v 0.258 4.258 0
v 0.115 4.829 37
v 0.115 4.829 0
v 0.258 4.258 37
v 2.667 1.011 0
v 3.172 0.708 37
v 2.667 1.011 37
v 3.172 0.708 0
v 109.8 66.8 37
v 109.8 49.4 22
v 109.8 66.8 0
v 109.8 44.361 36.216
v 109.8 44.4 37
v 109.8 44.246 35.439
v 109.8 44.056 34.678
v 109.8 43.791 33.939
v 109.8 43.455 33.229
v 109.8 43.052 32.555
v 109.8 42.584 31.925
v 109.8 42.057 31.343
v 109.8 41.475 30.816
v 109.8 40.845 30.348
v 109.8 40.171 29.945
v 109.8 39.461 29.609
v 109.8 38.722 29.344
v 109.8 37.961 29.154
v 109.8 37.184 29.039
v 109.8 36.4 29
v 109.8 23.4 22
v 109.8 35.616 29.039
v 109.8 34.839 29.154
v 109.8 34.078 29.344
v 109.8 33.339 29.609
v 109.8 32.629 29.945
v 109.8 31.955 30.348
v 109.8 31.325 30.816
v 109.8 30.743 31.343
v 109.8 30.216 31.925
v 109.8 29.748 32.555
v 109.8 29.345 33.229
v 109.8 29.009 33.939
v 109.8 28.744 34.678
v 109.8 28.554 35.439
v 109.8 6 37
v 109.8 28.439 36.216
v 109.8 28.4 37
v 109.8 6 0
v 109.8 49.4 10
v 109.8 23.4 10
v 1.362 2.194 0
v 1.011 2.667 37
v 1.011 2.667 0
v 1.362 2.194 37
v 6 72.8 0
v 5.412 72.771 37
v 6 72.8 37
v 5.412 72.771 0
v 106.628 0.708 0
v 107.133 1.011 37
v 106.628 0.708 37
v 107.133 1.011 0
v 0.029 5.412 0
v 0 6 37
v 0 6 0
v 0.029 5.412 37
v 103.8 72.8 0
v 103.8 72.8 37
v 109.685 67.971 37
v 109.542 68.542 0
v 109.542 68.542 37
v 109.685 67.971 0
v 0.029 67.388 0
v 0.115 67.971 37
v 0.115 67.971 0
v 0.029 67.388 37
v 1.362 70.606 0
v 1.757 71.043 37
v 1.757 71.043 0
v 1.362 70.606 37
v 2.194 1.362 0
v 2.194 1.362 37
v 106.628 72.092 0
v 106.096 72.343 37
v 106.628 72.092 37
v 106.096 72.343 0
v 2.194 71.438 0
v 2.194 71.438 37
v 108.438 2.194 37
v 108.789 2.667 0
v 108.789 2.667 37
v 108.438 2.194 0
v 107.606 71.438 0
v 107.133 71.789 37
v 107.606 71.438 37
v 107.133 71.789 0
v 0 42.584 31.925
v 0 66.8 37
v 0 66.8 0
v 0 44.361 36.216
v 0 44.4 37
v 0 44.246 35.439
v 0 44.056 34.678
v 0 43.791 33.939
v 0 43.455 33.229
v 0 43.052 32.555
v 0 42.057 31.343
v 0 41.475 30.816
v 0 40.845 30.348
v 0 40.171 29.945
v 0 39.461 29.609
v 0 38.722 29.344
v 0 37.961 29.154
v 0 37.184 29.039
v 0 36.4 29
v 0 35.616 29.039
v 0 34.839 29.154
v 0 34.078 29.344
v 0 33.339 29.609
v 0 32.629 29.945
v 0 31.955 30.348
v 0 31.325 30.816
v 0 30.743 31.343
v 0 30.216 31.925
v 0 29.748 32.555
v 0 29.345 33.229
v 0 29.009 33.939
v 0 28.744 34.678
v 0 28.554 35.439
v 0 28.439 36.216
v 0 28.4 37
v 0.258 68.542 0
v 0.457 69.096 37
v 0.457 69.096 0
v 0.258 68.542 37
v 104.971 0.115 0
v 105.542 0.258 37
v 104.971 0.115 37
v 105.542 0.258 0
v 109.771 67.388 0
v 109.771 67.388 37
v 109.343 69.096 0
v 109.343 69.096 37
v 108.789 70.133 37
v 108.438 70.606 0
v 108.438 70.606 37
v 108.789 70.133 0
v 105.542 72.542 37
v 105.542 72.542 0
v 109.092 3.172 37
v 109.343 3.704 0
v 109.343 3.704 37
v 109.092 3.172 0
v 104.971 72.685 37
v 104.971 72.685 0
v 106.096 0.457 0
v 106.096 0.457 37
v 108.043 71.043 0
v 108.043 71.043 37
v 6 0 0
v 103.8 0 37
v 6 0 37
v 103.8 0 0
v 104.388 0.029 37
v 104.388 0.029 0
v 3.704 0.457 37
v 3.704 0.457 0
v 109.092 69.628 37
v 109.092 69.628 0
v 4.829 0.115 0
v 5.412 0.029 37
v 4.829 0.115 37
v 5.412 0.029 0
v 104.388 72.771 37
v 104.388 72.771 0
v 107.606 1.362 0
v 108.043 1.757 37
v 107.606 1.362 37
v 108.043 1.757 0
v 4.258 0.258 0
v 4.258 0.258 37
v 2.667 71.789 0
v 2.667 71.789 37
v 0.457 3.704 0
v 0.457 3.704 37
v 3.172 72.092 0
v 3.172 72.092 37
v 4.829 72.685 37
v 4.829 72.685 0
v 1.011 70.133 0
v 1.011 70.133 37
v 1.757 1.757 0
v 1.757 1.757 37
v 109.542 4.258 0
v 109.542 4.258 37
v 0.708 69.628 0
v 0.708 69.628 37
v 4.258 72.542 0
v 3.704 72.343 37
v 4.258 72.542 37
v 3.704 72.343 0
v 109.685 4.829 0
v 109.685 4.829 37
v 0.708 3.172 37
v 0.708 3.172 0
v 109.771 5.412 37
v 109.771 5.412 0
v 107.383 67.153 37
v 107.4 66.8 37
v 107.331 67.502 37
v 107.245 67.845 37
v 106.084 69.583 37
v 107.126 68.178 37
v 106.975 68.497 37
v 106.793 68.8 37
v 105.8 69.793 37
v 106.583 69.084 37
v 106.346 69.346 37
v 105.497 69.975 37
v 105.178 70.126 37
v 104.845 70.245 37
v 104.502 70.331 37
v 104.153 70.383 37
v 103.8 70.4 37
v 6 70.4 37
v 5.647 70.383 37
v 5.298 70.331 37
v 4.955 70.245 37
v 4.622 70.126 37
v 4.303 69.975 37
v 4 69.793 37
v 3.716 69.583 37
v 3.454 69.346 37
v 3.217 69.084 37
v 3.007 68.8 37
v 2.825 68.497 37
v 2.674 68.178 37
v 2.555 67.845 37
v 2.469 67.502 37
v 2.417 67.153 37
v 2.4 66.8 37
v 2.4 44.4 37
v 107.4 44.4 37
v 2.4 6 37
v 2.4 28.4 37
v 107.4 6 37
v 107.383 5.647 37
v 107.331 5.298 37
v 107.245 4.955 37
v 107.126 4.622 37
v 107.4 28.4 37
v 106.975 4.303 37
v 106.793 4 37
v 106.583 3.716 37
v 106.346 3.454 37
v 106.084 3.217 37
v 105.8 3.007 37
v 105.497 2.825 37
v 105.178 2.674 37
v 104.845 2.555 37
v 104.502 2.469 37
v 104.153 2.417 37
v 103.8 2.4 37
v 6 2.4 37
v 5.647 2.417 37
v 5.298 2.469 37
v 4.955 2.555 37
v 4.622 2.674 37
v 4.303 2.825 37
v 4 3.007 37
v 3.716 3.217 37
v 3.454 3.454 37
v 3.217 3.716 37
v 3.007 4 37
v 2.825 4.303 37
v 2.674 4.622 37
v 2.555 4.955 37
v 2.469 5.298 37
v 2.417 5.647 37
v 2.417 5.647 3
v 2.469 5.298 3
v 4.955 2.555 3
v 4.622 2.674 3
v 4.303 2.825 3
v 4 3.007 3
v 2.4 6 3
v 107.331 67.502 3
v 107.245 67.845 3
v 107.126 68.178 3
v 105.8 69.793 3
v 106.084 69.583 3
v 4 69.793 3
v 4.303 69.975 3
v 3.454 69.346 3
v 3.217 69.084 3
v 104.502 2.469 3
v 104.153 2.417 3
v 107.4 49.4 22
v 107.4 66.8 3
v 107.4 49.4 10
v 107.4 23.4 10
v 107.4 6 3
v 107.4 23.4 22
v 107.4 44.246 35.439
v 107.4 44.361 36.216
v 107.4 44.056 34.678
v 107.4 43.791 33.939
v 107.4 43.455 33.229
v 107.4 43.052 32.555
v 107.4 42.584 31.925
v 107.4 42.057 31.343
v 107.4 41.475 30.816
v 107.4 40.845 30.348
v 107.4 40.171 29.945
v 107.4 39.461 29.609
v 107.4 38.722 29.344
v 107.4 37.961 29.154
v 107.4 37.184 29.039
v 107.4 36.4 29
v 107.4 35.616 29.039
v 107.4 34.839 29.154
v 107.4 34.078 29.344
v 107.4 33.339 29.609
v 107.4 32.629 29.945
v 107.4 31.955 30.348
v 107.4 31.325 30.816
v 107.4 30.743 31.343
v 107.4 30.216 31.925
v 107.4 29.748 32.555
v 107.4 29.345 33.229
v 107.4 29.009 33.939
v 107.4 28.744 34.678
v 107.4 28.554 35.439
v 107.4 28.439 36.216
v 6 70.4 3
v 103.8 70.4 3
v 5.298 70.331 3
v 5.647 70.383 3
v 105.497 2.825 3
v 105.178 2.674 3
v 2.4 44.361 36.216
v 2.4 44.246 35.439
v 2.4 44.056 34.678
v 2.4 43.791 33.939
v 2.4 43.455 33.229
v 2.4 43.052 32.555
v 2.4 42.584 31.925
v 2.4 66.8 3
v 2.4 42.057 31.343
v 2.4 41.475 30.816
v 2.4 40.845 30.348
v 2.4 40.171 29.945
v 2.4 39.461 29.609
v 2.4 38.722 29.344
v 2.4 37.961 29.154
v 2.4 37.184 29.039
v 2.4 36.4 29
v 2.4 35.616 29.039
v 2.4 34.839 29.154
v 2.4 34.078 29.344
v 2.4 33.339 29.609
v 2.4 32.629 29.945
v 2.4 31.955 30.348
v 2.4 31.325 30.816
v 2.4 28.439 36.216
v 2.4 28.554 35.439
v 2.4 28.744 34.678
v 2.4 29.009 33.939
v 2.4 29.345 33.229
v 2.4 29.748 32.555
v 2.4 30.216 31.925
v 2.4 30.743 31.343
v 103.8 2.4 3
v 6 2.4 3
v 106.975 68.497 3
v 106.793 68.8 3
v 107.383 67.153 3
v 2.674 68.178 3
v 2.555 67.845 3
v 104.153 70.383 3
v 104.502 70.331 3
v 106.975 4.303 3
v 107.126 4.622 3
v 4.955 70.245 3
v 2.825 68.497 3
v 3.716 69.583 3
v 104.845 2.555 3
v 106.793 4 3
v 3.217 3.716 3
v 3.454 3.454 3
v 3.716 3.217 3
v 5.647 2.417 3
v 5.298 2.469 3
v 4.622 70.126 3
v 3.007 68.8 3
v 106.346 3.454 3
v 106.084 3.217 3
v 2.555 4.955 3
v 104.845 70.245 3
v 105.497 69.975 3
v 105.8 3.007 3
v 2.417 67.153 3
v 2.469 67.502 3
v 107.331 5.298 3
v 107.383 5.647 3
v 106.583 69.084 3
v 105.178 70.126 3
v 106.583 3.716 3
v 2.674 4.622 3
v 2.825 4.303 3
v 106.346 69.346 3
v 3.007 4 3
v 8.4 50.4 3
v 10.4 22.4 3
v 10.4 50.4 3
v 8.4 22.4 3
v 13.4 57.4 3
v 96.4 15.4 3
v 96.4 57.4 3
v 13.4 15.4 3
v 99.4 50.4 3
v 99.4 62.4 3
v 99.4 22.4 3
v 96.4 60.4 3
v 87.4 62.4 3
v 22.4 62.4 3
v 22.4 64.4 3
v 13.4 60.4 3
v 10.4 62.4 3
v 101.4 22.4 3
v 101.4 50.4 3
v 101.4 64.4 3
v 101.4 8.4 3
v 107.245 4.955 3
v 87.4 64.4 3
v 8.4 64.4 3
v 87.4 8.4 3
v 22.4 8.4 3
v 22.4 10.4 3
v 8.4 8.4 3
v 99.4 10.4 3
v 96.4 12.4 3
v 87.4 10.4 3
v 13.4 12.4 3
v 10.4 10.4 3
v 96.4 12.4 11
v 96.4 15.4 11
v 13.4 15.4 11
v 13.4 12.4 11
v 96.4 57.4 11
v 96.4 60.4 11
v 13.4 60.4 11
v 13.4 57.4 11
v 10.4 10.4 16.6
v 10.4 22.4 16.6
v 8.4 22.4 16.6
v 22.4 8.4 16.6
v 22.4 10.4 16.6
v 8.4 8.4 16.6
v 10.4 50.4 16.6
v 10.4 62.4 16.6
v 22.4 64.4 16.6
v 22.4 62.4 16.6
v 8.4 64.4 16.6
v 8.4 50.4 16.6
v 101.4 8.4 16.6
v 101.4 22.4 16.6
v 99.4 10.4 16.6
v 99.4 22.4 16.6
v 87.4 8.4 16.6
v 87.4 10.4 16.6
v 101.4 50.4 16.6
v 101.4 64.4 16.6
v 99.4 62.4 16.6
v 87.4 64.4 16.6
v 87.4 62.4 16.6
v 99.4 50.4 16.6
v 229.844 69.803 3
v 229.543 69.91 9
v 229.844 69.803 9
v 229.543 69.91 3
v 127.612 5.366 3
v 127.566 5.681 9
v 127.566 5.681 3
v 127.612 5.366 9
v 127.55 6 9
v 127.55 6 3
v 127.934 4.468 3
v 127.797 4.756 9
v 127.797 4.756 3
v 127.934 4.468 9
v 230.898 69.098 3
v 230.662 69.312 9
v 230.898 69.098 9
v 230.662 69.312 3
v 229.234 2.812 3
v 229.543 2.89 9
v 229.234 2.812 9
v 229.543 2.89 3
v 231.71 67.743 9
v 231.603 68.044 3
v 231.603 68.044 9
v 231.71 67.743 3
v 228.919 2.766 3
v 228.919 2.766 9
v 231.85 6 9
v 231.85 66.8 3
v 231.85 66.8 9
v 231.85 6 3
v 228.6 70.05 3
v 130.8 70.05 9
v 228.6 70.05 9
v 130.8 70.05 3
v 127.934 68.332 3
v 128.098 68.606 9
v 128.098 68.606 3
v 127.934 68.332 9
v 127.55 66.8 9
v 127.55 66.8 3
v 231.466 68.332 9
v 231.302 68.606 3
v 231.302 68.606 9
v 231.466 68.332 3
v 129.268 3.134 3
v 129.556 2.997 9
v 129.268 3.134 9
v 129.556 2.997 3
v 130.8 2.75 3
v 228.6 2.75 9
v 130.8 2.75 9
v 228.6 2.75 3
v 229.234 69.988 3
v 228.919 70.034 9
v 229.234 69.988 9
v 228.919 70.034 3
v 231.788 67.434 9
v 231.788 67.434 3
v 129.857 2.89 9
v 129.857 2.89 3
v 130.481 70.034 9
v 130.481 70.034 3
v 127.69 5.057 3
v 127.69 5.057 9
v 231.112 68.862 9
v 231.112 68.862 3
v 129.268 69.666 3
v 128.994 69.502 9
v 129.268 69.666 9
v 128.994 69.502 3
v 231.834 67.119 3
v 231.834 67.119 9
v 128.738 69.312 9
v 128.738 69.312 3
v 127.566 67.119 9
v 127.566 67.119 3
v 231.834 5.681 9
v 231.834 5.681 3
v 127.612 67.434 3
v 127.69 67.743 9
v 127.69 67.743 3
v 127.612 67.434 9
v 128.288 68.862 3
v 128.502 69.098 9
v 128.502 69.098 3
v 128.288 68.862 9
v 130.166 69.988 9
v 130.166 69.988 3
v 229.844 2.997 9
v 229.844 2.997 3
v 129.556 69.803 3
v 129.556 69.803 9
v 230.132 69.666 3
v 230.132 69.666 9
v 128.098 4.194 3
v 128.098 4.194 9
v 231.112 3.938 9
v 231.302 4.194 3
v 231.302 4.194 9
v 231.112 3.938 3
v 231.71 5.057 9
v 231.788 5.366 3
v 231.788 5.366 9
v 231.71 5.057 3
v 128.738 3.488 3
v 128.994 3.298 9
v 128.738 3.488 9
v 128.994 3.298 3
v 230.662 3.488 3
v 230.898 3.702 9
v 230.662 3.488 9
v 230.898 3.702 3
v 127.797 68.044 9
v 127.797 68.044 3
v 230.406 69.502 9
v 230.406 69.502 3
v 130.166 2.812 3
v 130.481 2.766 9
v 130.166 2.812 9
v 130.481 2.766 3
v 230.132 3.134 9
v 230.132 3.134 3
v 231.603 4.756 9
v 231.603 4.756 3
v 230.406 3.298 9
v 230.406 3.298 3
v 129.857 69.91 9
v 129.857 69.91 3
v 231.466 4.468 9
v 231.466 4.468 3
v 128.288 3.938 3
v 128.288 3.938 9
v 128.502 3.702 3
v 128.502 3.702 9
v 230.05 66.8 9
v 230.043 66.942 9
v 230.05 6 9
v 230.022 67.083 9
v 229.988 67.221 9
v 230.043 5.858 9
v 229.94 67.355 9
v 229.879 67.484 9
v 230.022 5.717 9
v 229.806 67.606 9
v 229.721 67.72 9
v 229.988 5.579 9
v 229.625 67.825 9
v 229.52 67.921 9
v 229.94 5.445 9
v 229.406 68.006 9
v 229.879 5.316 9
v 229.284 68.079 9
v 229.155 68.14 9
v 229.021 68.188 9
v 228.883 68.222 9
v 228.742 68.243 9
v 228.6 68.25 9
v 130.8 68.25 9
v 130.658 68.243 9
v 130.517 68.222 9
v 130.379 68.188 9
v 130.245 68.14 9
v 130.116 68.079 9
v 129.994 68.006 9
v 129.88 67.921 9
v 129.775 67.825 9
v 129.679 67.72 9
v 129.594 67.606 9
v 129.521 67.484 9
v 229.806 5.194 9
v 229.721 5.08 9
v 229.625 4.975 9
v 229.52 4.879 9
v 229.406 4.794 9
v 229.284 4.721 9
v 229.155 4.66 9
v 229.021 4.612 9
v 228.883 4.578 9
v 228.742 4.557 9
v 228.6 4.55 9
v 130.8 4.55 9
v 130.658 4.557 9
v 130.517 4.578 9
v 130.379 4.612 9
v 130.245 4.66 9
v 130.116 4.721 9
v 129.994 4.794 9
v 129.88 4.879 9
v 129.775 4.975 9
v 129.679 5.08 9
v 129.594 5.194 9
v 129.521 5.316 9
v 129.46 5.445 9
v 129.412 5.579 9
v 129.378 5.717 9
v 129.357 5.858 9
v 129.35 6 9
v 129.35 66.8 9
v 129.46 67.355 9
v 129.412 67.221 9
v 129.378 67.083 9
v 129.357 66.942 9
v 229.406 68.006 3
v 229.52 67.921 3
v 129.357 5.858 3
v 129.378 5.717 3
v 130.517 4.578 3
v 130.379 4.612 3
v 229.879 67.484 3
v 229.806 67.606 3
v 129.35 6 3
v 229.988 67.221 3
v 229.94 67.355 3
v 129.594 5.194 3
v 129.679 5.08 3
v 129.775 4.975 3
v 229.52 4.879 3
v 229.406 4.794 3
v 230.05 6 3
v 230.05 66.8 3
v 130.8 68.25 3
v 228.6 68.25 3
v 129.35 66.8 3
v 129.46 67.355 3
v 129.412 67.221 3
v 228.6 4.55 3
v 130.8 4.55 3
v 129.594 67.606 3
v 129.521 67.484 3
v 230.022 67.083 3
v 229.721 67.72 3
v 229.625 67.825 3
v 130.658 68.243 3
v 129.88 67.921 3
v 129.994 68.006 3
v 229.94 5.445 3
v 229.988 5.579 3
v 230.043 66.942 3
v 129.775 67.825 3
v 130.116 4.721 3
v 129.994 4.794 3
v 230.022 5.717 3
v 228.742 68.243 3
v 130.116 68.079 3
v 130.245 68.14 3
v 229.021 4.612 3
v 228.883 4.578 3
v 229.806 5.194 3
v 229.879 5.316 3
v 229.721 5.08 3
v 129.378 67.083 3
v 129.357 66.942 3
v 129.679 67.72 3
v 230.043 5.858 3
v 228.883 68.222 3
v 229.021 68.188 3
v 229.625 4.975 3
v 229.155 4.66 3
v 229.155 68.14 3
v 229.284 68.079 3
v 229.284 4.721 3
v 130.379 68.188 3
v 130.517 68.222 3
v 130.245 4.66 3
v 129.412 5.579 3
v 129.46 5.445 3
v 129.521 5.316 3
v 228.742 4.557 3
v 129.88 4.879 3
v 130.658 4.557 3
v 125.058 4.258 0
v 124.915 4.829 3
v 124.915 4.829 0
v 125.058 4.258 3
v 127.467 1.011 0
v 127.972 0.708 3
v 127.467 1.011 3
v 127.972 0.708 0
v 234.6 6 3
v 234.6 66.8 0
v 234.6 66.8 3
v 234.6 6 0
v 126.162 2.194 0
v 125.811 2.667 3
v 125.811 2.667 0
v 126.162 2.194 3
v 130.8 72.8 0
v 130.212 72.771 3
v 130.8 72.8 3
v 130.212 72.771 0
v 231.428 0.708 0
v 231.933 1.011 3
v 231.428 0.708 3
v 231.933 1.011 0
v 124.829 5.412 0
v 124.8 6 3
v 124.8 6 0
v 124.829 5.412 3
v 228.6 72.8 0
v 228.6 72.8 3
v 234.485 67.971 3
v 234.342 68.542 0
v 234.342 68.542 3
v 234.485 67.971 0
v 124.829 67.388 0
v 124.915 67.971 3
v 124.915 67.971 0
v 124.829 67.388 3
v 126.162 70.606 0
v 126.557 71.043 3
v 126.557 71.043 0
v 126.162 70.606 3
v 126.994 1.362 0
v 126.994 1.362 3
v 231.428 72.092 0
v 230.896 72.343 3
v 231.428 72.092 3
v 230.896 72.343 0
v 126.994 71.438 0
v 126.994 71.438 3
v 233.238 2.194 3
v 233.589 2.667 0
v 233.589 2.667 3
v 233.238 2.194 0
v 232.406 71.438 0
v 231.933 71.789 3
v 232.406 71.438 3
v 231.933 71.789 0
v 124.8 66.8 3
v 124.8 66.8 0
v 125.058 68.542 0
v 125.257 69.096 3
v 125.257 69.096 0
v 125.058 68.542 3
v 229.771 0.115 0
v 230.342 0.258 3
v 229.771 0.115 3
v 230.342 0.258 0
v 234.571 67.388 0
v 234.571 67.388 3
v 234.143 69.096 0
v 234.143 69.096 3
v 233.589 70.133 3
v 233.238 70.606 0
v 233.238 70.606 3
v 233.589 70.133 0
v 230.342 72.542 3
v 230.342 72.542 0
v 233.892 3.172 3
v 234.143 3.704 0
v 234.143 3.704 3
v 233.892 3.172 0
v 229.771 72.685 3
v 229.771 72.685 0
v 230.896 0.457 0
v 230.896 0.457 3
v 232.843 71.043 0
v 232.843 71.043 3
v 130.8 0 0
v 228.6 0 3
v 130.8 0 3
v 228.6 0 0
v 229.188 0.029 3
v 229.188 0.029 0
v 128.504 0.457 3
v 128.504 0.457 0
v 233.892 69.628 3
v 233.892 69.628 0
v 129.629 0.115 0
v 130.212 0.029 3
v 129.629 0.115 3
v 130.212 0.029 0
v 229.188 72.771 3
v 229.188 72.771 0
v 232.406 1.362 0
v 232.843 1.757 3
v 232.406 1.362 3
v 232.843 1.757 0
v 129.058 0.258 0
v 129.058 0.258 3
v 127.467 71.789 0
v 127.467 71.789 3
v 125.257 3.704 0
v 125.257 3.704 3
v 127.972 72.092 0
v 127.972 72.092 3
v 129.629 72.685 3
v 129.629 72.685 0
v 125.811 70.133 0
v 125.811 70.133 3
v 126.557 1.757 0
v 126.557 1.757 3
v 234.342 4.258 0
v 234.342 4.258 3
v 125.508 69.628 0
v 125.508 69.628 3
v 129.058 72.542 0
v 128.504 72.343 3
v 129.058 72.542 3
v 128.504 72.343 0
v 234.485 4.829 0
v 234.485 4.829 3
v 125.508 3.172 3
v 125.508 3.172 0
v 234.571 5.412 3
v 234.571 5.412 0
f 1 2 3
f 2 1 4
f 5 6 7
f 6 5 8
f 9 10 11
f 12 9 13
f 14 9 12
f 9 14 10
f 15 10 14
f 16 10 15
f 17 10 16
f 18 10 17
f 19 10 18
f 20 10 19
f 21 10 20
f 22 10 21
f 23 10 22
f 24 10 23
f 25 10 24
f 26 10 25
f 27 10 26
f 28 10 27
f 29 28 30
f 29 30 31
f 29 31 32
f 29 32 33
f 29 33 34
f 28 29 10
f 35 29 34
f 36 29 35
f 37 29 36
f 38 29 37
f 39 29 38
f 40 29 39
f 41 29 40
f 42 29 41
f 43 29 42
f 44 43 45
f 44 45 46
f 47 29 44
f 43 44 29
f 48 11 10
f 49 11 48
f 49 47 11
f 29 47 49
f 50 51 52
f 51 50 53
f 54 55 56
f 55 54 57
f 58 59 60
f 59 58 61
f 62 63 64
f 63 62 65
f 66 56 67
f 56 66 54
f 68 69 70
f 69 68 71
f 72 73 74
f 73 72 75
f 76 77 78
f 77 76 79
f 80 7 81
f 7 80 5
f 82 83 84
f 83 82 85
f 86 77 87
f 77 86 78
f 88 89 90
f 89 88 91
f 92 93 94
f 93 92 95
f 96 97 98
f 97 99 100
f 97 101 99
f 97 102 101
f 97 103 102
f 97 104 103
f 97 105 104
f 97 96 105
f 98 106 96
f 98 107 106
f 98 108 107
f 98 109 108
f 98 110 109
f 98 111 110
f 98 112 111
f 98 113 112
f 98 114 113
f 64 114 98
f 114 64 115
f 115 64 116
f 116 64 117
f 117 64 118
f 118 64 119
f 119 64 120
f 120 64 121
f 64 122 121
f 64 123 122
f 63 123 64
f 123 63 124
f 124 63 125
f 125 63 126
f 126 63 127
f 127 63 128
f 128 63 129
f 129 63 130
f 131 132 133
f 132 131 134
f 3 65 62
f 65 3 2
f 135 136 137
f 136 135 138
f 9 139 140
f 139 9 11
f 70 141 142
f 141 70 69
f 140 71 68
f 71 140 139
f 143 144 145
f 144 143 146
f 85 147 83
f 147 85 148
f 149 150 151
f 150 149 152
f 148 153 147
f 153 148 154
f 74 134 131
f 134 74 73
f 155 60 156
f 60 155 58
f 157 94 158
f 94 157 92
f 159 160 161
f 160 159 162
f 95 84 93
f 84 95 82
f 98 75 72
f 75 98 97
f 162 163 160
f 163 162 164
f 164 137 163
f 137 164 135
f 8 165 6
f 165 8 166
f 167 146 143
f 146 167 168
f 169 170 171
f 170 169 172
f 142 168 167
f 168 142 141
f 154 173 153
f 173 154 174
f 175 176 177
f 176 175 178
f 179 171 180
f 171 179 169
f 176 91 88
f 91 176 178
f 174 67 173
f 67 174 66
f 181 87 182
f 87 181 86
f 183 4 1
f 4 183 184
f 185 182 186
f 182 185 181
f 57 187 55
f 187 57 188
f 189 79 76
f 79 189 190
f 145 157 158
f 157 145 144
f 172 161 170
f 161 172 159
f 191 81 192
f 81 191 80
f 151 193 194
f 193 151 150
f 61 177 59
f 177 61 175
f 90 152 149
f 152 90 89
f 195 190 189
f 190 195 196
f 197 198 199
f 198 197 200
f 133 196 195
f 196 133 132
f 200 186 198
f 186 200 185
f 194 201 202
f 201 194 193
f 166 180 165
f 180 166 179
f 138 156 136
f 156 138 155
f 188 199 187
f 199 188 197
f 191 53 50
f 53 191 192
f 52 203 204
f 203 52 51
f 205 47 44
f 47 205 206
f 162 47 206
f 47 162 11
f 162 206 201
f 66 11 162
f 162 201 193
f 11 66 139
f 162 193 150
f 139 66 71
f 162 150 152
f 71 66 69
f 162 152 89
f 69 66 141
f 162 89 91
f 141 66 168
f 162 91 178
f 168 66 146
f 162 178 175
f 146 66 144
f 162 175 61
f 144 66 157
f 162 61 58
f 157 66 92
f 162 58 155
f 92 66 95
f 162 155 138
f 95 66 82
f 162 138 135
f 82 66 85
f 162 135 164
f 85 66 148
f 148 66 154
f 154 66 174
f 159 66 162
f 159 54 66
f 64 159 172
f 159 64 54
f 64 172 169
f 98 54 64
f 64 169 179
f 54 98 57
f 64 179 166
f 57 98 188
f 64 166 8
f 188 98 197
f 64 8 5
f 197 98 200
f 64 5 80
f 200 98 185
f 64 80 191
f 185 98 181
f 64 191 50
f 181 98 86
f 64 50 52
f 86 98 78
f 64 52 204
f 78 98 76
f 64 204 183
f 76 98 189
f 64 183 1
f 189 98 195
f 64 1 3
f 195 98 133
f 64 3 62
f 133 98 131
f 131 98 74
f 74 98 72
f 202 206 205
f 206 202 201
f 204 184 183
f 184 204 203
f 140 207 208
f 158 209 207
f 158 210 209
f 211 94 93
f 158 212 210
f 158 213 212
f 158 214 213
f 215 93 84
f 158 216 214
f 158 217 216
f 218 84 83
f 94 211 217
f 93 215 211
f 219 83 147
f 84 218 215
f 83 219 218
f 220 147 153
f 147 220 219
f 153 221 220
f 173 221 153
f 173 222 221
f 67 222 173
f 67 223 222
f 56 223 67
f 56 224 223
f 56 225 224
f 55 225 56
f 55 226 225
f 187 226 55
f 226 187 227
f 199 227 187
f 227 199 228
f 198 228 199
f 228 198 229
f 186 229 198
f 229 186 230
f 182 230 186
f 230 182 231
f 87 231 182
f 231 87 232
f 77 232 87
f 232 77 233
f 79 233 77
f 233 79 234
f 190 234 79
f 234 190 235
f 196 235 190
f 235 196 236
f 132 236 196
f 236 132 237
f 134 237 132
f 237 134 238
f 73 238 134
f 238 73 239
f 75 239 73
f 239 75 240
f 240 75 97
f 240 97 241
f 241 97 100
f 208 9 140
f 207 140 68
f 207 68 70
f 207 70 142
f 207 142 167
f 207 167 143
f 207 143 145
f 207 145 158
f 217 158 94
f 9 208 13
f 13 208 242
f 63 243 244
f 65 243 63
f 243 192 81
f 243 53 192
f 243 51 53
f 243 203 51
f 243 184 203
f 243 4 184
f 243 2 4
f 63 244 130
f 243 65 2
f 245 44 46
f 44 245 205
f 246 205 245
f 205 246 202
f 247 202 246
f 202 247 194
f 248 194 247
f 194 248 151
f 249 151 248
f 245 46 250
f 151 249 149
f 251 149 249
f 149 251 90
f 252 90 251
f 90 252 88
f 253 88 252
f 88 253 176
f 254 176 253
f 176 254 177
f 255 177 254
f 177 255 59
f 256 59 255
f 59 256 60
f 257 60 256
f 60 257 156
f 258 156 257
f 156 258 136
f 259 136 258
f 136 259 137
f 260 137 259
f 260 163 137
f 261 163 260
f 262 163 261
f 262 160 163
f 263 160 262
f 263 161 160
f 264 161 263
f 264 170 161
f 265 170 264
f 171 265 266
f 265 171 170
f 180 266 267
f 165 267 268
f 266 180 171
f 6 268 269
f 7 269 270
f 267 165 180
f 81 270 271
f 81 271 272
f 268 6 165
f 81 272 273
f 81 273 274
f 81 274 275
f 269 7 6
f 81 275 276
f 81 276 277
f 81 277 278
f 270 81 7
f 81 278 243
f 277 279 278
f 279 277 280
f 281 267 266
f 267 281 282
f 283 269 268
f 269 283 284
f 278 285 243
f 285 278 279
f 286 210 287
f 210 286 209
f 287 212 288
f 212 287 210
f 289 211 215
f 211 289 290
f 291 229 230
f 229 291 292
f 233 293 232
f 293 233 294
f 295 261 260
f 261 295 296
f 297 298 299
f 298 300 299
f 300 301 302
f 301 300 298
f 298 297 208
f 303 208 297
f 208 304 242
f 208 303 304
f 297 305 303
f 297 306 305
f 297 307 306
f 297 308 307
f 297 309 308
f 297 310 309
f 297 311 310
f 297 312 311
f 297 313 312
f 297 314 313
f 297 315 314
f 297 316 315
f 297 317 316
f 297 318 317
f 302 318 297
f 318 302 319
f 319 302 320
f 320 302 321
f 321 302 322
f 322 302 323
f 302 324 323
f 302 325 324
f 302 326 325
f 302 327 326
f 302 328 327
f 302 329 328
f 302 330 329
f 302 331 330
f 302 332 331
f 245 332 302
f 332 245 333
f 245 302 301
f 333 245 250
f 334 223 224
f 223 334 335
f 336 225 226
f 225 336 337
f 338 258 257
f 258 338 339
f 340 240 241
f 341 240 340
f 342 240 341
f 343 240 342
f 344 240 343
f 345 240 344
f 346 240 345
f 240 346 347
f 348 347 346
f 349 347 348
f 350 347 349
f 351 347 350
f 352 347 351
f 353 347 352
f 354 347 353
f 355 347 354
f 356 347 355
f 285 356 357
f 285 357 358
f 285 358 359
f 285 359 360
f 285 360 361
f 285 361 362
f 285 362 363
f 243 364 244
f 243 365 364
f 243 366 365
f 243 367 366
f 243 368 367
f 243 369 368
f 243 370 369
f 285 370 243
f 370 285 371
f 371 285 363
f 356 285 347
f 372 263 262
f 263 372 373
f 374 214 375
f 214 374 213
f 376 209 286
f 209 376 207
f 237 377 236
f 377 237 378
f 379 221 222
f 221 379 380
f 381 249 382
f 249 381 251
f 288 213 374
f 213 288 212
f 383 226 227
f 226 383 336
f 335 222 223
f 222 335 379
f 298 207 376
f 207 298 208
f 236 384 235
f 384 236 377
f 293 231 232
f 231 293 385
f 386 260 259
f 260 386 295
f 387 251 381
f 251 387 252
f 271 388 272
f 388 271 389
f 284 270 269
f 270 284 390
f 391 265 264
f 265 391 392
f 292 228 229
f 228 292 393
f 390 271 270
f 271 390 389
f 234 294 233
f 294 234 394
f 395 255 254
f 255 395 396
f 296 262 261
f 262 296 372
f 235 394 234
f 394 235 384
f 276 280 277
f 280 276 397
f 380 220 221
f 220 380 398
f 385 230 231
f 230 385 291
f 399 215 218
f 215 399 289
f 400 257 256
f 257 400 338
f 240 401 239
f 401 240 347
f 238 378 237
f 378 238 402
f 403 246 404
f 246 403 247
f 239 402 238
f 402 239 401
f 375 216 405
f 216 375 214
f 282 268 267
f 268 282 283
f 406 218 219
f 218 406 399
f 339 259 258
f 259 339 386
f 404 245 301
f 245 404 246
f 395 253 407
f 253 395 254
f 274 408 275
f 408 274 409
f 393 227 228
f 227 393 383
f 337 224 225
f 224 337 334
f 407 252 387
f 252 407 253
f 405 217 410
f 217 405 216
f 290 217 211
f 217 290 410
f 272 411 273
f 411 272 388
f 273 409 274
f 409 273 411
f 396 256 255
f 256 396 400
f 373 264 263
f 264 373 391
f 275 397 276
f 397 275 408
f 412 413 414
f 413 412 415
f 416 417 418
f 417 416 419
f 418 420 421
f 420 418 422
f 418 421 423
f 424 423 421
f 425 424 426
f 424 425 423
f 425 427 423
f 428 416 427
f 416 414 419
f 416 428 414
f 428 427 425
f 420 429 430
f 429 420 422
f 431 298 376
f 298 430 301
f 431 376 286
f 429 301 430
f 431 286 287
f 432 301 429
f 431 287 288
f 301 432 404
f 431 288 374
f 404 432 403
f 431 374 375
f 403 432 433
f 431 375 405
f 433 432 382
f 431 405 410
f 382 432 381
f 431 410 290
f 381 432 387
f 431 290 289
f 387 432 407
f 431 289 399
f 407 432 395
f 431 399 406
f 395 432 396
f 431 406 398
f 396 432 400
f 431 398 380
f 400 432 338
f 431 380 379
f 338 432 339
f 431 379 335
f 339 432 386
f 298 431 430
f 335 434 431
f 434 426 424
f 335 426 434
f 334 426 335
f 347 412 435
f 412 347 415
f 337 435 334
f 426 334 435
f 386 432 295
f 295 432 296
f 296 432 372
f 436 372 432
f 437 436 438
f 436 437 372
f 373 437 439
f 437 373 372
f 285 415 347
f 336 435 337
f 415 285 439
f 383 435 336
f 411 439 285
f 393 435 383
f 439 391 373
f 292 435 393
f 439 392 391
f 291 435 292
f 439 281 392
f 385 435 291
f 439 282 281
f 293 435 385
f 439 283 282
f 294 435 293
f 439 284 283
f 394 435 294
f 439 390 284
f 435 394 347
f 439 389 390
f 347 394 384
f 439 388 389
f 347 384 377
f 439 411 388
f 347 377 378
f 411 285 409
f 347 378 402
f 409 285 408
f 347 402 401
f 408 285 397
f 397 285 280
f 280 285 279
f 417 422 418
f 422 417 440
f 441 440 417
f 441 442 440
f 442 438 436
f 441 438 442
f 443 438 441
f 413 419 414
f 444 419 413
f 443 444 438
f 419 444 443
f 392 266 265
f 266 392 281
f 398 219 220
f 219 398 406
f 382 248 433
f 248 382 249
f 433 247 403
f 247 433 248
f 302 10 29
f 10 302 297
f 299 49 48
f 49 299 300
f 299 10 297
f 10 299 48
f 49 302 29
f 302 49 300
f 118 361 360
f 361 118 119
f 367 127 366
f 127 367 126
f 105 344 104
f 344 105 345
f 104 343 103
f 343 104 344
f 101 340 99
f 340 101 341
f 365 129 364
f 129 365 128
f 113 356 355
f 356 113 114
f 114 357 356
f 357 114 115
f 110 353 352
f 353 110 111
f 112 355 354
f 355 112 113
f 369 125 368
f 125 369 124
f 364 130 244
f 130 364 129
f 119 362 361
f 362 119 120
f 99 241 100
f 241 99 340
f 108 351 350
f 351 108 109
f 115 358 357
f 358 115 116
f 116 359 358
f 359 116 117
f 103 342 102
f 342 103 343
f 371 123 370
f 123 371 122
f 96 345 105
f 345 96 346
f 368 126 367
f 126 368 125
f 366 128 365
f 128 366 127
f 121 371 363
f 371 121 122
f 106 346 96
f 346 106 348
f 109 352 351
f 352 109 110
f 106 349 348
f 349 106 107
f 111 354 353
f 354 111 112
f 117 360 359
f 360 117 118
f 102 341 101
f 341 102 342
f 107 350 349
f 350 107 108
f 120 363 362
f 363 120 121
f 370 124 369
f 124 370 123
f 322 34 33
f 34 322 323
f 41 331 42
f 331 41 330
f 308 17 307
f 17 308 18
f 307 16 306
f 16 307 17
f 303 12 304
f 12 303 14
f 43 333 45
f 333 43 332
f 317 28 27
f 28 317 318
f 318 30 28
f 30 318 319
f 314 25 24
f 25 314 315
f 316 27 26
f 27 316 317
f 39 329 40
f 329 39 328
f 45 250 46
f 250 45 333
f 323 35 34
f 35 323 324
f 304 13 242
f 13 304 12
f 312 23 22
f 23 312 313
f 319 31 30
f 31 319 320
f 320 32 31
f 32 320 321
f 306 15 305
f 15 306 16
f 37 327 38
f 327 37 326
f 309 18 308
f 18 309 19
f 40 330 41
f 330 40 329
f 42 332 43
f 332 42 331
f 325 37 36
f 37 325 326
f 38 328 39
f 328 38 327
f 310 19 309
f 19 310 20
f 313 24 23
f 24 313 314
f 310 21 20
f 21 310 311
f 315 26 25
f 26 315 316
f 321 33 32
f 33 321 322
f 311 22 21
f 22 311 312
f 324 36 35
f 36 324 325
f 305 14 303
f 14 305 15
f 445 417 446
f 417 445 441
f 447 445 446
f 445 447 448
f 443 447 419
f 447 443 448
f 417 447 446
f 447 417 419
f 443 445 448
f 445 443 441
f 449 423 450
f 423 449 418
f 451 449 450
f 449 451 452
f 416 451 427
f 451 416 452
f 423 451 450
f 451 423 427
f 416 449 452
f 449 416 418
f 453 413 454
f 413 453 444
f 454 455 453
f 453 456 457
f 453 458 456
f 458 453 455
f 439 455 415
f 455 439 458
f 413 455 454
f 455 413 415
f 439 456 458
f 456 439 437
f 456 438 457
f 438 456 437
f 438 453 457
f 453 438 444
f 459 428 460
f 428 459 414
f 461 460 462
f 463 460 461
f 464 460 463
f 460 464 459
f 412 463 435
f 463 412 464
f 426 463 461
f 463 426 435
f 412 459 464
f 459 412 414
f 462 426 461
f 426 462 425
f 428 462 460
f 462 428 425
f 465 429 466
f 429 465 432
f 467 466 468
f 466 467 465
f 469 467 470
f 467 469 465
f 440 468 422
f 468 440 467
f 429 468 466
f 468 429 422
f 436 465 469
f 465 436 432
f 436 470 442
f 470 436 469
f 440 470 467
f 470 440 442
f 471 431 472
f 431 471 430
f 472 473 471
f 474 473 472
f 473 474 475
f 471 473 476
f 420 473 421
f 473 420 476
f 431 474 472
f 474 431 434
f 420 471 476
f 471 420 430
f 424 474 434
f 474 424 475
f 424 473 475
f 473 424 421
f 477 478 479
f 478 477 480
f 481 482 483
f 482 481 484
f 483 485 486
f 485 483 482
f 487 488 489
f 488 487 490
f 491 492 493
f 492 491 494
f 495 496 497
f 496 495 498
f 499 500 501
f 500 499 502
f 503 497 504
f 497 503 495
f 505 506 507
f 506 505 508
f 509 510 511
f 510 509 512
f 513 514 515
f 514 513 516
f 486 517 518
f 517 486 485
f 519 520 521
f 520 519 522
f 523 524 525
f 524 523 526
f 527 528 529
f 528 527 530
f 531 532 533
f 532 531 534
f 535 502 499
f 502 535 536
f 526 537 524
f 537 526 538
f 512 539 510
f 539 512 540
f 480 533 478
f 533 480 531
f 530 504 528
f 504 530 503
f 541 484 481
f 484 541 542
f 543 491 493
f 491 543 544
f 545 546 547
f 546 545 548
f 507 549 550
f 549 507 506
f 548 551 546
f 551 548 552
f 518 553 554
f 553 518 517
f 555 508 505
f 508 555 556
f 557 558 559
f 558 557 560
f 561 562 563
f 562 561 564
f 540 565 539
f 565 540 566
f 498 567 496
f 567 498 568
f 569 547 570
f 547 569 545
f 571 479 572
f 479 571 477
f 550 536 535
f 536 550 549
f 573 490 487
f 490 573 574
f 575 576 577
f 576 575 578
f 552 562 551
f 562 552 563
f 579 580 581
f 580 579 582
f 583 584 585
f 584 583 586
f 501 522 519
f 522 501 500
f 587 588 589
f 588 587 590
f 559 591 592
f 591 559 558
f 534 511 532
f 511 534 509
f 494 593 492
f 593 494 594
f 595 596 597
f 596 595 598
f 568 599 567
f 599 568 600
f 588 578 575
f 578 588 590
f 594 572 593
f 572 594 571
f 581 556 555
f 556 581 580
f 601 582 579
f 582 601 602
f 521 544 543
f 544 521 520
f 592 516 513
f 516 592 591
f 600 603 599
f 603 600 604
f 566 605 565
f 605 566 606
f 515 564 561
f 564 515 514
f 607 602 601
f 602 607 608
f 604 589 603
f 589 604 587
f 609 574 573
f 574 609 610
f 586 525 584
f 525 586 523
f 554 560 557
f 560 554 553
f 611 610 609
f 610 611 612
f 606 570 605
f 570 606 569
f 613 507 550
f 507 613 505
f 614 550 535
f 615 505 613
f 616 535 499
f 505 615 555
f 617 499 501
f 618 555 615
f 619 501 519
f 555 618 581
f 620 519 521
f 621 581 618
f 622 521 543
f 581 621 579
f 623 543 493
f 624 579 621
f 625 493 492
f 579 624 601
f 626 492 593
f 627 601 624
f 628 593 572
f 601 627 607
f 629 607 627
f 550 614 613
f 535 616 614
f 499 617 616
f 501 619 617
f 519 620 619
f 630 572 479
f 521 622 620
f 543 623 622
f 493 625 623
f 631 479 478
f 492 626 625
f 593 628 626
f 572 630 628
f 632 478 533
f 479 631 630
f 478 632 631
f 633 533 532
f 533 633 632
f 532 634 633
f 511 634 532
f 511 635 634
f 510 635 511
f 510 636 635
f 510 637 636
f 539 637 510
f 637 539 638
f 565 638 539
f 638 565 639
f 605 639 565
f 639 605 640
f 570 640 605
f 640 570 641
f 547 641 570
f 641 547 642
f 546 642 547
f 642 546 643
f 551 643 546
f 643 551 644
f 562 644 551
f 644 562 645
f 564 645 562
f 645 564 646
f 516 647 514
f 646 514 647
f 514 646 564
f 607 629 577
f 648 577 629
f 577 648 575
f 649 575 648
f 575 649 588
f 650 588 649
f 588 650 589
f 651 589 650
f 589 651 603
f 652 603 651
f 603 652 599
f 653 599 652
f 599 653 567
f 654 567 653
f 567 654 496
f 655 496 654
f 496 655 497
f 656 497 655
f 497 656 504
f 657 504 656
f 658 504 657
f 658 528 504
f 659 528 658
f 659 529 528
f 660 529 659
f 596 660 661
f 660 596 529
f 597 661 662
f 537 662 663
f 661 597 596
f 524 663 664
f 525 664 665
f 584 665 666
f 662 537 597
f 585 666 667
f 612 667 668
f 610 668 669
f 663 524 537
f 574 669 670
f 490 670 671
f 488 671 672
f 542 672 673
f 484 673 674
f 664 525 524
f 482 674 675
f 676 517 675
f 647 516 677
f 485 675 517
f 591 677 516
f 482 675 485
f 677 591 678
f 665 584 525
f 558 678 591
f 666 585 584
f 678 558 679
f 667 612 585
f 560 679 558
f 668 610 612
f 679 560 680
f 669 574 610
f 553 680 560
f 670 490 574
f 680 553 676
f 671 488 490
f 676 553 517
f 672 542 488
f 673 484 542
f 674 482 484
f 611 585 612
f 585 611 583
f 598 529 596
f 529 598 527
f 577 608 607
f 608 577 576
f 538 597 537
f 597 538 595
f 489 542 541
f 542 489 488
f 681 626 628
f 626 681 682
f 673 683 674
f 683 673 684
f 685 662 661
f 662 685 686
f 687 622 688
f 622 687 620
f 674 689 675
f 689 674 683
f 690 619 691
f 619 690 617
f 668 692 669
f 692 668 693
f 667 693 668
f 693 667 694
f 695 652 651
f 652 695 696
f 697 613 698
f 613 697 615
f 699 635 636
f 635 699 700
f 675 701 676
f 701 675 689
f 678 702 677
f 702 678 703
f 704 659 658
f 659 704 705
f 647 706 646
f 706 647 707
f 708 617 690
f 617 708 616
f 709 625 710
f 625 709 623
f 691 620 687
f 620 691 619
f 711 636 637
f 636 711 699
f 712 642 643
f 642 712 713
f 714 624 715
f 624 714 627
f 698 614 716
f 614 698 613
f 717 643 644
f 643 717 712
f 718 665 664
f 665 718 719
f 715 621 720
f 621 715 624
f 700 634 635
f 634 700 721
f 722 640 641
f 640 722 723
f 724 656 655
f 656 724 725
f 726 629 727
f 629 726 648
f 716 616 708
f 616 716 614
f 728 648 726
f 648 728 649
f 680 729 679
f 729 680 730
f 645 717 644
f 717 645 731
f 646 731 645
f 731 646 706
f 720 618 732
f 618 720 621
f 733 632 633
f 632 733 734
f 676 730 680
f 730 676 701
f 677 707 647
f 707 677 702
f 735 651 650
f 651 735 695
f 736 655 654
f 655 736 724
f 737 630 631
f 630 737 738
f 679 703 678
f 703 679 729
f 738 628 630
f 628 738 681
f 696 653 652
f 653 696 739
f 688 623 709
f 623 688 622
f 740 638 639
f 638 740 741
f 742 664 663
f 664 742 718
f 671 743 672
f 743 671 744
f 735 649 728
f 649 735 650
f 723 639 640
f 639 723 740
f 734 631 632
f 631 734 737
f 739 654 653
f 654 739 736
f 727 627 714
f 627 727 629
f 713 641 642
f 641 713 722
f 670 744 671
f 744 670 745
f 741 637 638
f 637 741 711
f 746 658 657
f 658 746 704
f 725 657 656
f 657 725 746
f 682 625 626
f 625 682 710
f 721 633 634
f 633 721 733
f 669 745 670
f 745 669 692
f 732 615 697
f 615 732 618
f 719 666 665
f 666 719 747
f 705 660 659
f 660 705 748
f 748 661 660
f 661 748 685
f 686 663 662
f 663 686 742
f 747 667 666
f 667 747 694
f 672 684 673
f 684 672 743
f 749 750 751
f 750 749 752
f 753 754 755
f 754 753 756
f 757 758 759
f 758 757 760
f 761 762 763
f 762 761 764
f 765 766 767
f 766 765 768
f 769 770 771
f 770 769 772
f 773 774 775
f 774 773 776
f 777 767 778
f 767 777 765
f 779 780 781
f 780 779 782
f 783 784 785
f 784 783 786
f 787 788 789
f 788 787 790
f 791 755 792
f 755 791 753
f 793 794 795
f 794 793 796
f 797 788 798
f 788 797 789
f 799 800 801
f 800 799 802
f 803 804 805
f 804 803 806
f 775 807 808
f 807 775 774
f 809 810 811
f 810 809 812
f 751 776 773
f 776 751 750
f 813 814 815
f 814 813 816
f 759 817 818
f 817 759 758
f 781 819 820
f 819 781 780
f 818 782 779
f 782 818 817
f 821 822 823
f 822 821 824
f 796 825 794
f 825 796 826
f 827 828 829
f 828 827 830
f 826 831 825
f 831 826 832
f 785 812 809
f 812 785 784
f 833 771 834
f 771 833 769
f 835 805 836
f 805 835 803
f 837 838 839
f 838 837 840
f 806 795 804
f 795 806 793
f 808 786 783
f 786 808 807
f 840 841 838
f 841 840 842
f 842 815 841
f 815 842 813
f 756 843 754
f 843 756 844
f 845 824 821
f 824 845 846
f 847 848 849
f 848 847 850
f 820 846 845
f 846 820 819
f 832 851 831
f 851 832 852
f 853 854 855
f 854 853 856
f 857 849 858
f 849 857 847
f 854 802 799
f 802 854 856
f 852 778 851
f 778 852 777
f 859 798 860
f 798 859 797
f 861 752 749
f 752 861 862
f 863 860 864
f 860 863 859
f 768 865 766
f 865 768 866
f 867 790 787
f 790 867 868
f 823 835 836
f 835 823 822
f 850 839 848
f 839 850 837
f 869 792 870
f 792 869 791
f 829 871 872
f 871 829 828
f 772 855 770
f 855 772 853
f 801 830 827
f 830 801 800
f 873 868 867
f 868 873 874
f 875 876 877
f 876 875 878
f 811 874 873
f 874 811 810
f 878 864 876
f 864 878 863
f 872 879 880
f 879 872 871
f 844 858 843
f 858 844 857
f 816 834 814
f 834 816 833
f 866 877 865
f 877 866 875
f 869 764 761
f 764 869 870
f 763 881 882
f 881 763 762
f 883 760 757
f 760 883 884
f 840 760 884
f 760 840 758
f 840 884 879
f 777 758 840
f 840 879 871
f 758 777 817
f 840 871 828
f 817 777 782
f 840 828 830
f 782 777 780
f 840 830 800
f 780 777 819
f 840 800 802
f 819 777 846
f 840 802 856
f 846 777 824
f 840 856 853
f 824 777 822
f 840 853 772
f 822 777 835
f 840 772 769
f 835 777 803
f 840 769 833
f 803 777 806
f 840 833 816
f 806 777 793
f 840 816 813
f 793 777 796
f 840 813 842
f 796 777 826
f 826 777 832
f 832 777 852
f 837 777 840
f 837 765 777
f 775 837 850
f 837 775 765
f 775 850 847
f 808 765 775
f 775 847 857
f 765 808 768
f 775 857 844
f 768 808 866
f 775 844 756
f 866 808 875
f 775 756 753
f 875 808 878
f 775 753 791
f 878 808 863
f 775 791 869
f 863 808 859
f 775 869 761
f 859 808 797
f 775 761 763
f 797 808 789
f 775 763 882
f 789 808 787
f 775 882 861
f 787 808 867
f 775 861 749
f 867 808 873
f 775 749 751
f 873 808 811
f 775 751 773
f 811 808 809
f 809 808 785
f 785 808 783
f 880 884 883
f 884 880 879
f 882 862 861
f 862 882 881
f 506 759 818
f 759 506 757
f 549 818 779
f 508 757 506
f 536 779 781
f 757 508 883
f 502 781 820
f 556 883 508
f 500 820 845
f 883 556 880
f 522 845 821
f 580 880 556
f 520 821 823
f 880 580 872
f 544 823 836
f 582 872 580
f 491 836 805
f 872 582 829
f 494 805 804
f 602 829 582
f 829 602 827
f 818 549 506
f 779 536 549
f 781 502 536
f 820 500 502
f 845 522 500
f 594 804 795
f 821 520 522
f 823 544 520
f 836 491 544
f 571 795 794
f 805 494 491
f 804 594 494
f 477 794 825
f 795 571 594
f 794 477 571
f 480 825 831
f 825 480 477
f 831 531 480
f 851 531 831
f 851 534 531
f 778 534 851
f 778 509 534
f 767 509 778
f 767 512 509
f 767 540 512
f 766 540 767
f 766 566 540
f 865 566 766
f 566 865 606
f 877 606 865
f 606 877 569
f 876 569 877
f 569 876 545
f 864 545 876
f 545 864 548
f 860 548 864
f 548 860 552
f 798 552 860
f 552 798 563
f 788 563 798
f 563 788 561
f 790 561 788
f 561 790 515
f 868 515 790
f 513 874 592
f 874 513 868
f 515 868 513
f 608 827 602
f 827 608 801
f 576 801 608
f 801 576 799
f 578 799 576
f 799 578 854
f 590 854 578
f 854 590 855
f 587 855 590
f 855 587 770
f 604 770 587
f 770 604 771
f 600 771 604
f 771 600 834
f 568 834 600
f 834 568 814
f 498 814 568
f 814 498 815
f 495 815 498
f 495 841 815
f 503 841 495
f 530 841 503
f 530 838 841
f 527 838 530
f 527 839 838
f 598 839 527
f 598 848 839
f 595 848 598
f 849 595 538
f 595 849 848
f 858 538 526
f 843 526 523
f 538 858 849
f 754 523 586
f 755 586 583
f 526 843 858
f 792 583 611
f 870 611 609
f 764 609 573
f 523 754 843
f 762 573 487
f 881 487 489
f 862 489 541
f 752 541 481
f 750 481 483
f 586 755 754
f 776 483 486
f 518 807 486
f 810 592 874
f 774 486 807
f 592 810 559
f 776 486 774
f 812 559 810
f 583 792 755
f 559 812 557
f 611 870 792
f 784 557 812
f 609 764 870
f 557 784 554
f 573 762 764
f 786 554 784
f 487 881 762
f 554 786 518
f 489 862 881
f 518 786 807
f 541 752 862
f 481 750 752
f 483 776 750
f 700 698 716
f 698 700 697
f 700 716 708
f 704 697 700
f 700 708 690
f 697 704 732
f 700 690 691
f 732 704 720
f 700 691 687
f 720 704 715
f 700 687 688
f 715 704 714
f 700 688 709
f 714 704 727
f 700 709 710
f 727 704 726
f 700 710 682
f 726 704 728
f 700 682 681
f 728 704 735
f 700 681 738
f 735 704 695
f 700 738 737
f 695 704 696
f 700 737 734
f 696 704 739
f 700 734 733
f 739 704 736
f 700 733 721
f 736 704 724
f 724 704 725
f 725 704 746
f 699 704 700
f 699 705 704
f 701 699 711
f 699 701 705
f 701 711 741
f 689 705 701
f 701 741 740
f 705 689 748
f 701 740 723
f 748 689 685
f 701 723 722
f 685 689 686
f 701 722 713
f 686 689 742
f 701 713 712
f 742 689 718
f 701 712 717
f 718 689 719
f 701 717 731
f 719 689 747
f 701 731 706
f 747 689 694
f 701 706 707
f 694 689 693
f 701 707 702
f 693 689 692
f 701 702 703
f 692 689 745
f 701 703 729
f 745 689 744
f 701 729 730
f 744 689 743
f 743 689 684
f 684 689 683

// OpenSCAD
/*
ED-3 parametric perfboard enclosure
Author: Trishan Biswas
Created: 16 October 2026

The enclosure holds one 89 mm by 52 mm perfboard and routes the five-wire
Arduino harness through a single side opening. Dimensions are in millimetres.

Set part to "base", "lid", "assembled" or "layout" before rendering.
The default layout places both printable parts on the build plane.
*/

$fn = 64;

part = "layout";
// Numeric override for command-line exports where shell quoting is awkward:
// 0 = base, 1 = lid, 2 = assembled preview, 3 = print layout.
part_id = -1;

// Measured board envelope.
board_length = 89;
board_width = 52;
board_thickness = 1.6;

// Enclosure sizing.
board_side_clearance = 8;
internal_height = 34;       // Gives 24.4 mm above the supported perfboard.
wall = 2.4;
floor_thickness = 3;
lid_top_thickness = 3;
outer_corner_radius = 6;

// Board support and restraint.
support_height = 8;
support_rail_width = 3;
corner_guide_thickness = 2;
corner_guide_length = 12;
corner_guide_above_board = 4;

// Lid fit. Increase this if the first print is too tight.
lid_clearance_per_side = 0.35;
lid_lip_depth = 6;
lid_lip_wall = 1.8;

// Five-wire Arduino harness: 5 V, 3.3 V, GND, A0 and D7.
cable_slot_width = 26;
cable_slot_height = 12;
cable_slot_floor = floor_thickness + support_height - 1;

// Derived dimensions.
inner_length = board_length + 2 * board_side_clearance;
inner_width = board_width + 2 * board_side_clearance;
outer_length = inner_length + 2 * wall;
outer_width = inner_width + 2 * wall;
base_height = floor_thickness + internal_height;

board_x = wall + board_side_clearance;
board_y = wall + board_side_clearance;
board_z = floor_thickness + support_height;

module rounded_rectangle(size_x, size_y, radius) {
    hull() {
        translate([radius, radius]) circle(r = radius);
        translate([size_x - radius, radius]) circle(r = radius);
        translate([radius, size_y - radius]) circle(r = radius);
        translate([size_x - radius, size_y - radius]) circle(r = radius);
    }
}

module rounded_prism(size_x, size_y, height, radius) {
    linear_extrude(height = height)
        rounded_rectangle(size_x, size_y, radius);
}

module base_shell() {
    difference() {
        rounded_prism(
            outer_length,
            outer_width,
            base_height,
            outer_corner_radius
        );

        // Main internal cavity. Extending the cut above the body leaves an
        // open top while retaining the specified floor thickness.
        translate([wall, wall, floor_thickness])
            rounded_prism(
                inner_length,
                inner_width,
                internal_height + 1,
                max(outer_corner_radius - wall, 1)
            );

        // One bundle opening on the Arduino-facing short wall. It is wide
        // enough for five individual Dupont-style leads or a sleeved bundle.
        translate([
            outer_length - wall - 1,
            (outer_width - cable_slot_width) / 2,
            cable_slot_floor
        ])
            cube([
                wall + 2,
                cable_slot_width,
                cable_slot_height
            ]);

        // Two shallow thumb notches make the friction-fit lid easier to lift.
        translate([-1, outer_width / 2, base_height])
            rotate([0, 90, 0])
                cylinder(h = wall + 2, r = 8);
        translate([outer_length - wall - 1, outer_width / 2, base_height])
            rotate([0, 90, 0])
                cylinder(h = wall + 2, r = 8);
    }
}

module support_rails() {
    // Two rails support the long edges without relying on mounting-hole
    // positions. They also leave an air gap beneath the perfboard.
    for (rail_y = [
        board_y + 2,
        board_y + board_width - support_rail_width - 2
    ]) {
        translate([
            board_x + 3,
            rail_y,
            floor_thickness - 0.1
        ])
            cube([
                board_length - 6,
                support_rail_width,
                support_height + 0.1
            ]);
    }
}

module corner_guide(x_side, y_side) {
    guide_height = support_height + board_thickness + corner_guide_above_board;
    x0 = x_side == 0
        ? board_x - corner_guide_thickness
        : board_x + board_length;
    y0 = y_side == 0
        ? board_y - corner_guide_thickness
        : board_y + board_width;
    x_arm = x_side == 0
        ? board_x - corner_guide_thickness
        : board_x + board_length - corner_guide_length;
    y_arm = y_side == 0
        ? board_y - corner_guide_thickness
        : board_y + board_width - corner_guide_length;

    // The L-shaped guides stop lateral movement while leaving the board free
    // to lift out during development.
    translate([x0, y_arm, floor_thickness - 0.1])
        cube([
            corner_guide_thickness,
            corner_guide_length + corner_guide_thickness,
            guide_height + 0.1
        ]);

    translate([x_arm, y0, floor_thickness - 0.1])
        cube([
            corner_guide_length + corner_guide_thickness,
            corner_guide_thickness,
            guide_height + 0.1
        ]);
}

module base() {
    union() {
        base_shell();
        support_rails();
        for (x_side = [0, 1])
            for (y_side = [0, 1])
                corner_guide(x_side, y_side);
    }
}

module lid() {
    lip_outer_length = inner_length - 2 * lid_clearance_per_side;
    lip_outer_width = inner_width - 2 * lid_clearance_per_side;
    lip_radius = max(outer_corner_radius - wall - lid_clearance_per_side, 1);

    union() {
        // Print this outer face directly on the build plate. The locating lip
        // rises above it and faces into the enclosure after assembly.
        rounded_prism(
            outer_length,
            outer_width,
            lid_top_thickness,
            outer_corner_radius
        );

        translate([
            wall + lid_clearance_per_side,
            wall + lid_clearance_per_side,
            lid_top_thickness - 0.1
        ])
            difference() {
                rounded_prism(
                    lip_outer_length,
                    lip_outer_width,
                    lid_lip_depth + 0.1,
                    lip_radius
                );
                translate([lid_lip_wall, lid_lip_wall, -0.1])
                    rounded_prism(
                        lip_outer_length - 2 * lid_lip_wall,
                        lip_outer_width - 2 * lid_lip_wall,
                        lid_lip_depth + 0.3,
                        max(lip_radius - lid_lip_wall, 0.8)
                    );
            }
    }
}

module board_preview() {
    color([0.12, 0.48, 0.22, 0.65])
        translate([board_x, board_y, board_z])
            cube([board_length, board_width, board_thickness]);
}

module assembled_preview() {
    color([0.82, 0.84, 0.88]) base();
    board_preview();

    // The lid is shown transparent and flipped into its assembled position.
    color([0.65, 0.72, 0.82, 0.35])
        translate([0, outer_width, base_height + lid_top_thickness])
            rotate([180, 0, 0])
                lid();
}

selected_part = part_id == 0 ? "base"
    : part_id == 1 ? "lid"
    : part_id == 2 ? "assembled"
    : part_id == 3 ? "layout"
    : part;

if (selected_part == "base") {
    base();
} else if (selected_part == "lid") {
    lid();
} else if (selected_part == "assembled") {
    assembled_preview();
} else {
    base();
    translate([outer_length + 15, 0, 0]) lid();
}
